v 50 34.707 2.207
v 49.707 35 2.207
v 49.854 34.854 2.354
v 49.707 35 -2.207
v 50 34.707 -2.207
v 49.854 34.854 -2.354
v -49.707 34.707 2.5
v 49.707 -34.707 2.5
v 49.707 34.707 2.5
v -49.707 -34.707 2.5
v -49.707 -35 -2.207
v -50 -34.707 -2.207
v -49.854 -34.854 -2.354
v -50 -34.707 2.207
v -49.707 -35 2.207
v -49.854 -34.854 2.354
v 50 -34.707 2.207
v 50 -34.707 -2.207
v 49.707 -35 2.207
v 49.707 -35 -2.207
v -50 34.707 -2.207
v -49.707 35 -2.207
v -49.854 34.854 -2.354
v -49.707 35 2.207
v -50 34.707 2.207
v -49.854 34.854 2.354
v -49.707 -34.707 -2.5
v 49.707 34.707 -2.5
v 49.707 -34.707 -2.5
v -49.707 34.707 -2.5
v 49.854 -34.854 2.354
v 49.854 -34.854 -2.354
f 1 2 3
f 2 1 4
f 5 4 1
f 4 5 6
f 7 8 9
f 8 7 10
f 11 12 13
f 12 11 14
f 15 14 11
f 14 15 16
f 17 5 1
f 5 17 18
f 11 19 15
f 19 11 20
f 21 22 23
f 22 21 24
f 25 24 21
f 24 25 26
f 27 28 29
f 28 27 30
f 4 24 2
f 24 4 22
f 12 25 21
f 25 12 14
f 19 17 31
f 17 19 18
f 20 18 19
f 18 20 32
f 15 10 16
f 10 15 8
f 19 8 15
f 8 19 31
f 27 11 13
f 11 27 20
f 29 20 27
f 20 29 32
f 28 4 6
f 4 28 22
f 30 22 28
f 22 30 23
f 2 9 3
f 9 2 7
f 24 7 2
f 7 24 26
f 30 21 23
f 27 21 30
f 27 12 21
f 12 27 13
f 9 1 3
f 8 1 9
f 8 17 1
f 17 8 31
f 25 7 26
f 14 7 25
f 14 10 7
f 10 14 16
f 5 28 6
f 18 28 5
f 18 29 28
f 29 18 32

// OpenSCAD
/*[Part]*/
part_to_print = "tile base"; // [tile base, tile, puzzle base, puzzle piece]
tile_or_puzzle_piece_number = 1; // [1,2,3,4,5,6,7,8,9,10,11,12,13,14,15,16,17,18,19,20]
//does not apply to base-specific measurements
scale_all_parts = 100; // [50:500]

/*[Base Options]*/
base_width = 100; // [20:300]
base_height = 70; // [20:300]
base_thickness = 5; // [3:10]

/*[Tile Base Options]*/
num_columns = 3; // [1:5]
num_rows = 2; // [1:5]
rail_width = 2; // [0:20]
include_target_graphics = "yes"; // [yes,no]
include_tile_slots = "yes"; // [yes,no]
include_earth_and_sky_lines = "no"; // [yes,no]
move_lines_vertically = 0; 

/*[Puzzle Base Options]*/
base_shape = "rectangular"; // [rectangular, circular]
include_puzzle_piece_slots = "no"; // [yes,no]

/*[Tile-Piece Options]*/
tile_thickness = 3; // [3:9]
//tenths of a millimeter
slot_gap = 10; // [0:30]
graphic_height = 2; // [1:5]

/*[--Tile-Piece 1 Info]*/
core_concept_1 = ""; 
beyond_core_concept_1 = ""; 
basic_shape_1 = ""; 
move_1_vertically = 0; // [-200:200]
move_piece_1_horizontally = 0; // [-200:200]
piece_1_scaling = 100; // [50:200]
piece_1_height = 20; // [5:300]
piece_1_width = 20; // [5:300]
embed_RFID_tag_1 = "no"; // [yes,no]

/*[--Tile-Piece 2 Info]*/
core_concept_2 = ""; 
beyond_core_concept_2 = ""; 
basic_shape_2 = ""; 
move_2_vertically = 0; // [-200:200]
move_piece_2_horizontally = 0; // [-200:200]
piece_2_scaling = 100; // [50:200]
piece_2_height = 20; // [5:300]
piece_2_width = 20; // [5:300]
embed_RFID_tag_2 = "no"; // [yes,no]

/*[--Tile-Piece 3 Info]*/
core_concept_3 = ""; 
beyond_core_concept_3 = ""; 
basic_shape_3 = ""; 
move_3_vertically = 0; // [-200:200]
move_piece_3_horizontally = 0; // [-200:200]
piece_3_scaling = 100; // [50:200]
piece_3_height = 20; // [5:300]
piece_3_width = 20; // [5:300]
embed_RFID_tag_3 = "no"; // [yes,no]

/*[--Tile-Piece 4 Info]*/
core_concept_4 = ""; 
beyond_core_concept_4 = ""; 
basic_shape_4 = ""; 
move_4_vertically = 0; // [-200:200]
move_piece_4_horizontally = 0; // [-200:200]
piece_4_scaling = 100; // [50:200]
piece_4_height = 20; // [5:300]
piece_4_width = 20; // [5:300]
embed_RFID_tag_4 = "no"; // [yes,no]

/*[--Tile-Piece 5 Info]*/
core_concept_5 = ""; 
beyond_core_concept_5 = ""; 
basic_shape_5 = ""; 
move_5_vertically = 0; // [-200:200]
move_piece_5_horizontally = 0; // [-200:200]
piece_5_scaling = 100; // [50:200]
piece_5_height = 20; // [5:300]
piece_5_width = 20; // [5:300]
embed_RFID_tag_5 = "no"; // [yes,no]

/*[--Tile-Piece 6 Info]*/
core_concept_6 = ""; 
beyond_core_concept_6 = ""; 
basic_shape_6 = ""; 
move_6_vertically = 0; // [-200:200]
move_piece_6_horizontally = 0; // [-200:200]
piece_6_scaling = 100; // [50:200]
piece_6_height = 20; // [5:300]
piece_6_width = 20; // [5:300]
embed_RFID_tag_6 = "no"; // [yes,no]

/*[--Tile-Piece 7 Info]*/
core_concept_7 = ""; 
beyond_core_concept_7 = ""; 
basic_shape_7 = ""; 
move_7_vertically = 0; // [-200:200]
move_piece_7_horizontally = 0; // [-200:200]
piece_7_scaling = 100; // [50:200]
piece_7_height = 20; // [10:300]
piece_7_width = 20; // [10:300]
embed_RFID_tag_7 = "no"; // [yes,no]

/*[--Tile-Piece 8 Info]*/
core_concept_8 = ""; 
beyond_core_concept_8 = ""; 
basic_shape_8 = ""; 
move_8_vertically = 0; // [-200:200]
move_piece_8_horizontally = 0; // [-200:200]
piece_8_scaling = 100; // [50:200]
piece_8_height = 20; // [10:300]
piece_8_width = 20; // [10:300]
embed_RFID_tag_8 = "no"; // [yes,no]

/*[--Tile-Piece 9 Info]*/
core_concept_9 = ""; 
beyond_core_concept_9 = ""; 
basic_shape_9 = ""; 
move_9_vertically = 0; // [-200:200]
move_piece_9_horizontally = 0; // [-200:200]
piece_9_scaling = 100; // [50:200]
piece_9_height = 20; // [10:300]
piece_9_width = 20; // [10:300]
embed_RFID_tag_9 = "no"; // [yes,no]

/*[--Tile-Piece 10 Info]*/
core_concept_10 = ""; 
beyond_core_concept_10 = ""; 
basic_shape_10 = ""; 
move_10_vertically = 0; // [-200:200]
move_piece_10_horizontally = 0; // [-200:200]
piece_10_scaling = 100; // [50:200]
piece_10_height = 20; // [10:300]
piece_10_width = 20; // [10:300]
embed_RFID_tag_10 = "no"; // [yes,no]

/*[--Tile-Piece 11 Info]*/
core_concept_11 = ""; 
beyond_core_concept_11 = ""; 
basic_shape_11 = ""; 
move_11_vertically = 0; // [-200:200]
move_piece_11_horizontally = 0; // [-200:200]
piece_11_scaling = 100; // [50:200]
piece_11_height = 20; // [10:300]
piece_11_width = 20; // [10:300]
embed_RFID_tag_11 = "no"; // [yes,no]

/*[--Tile-Piece 12 Info]*/
core_concept_12 = ""; 
beyond_core_concept_12 = ""; 
basic_shape_12 = ""; 
move_12_vertically = 0; // [-200:200]
move_piece_12_horizontally = 0; // [-200:200]
piece_12_scaling = 100; // [50:200]
piece_12_height = 20; // [10:300]
piece_12_width = 20; // [10:300]
embed_RFID_tag_12 = "no"; // [yes,no]

/*[--Tile-Piece 13 Info]*/
core_concept_13 = ""; 
beyond_core_concept_13 = ""; 
basic_shape_13 = ""; 
move_13_vertically = 0; // [-200:200]
move_piece_13_horizontally = 0; // [-200:200]
piece_13_scaling = 100; // [50:200]
piece_13_height = 20; // [10:300]
piece_13_width = 20; // [10:300]
embed_RFID_tag_13 = "no"; // [yes,no]

/*[--Tile-Piece 14 Info]*/
core_concept_14 = ""; 
beyond_core_concept_14 = ""; 
basic_shape_14 = ""; 
move_14_vertically = 0; // [-200:200]
move_piece_14_horizontally = 0; // [-200:200]
piece_14_scaling = 100; // [50:200]
piece_14_height = 20; // [10:300]
piece_14_width = 20; // [10:300]
embed_RFID_tag_14 = "no"; // [yes,no]

/*[--Tile-Piece 15 Info]*/
core_concept_15 = ""; 
beyond_core_concept_15 = ""; 
basic_shape_15 = ""; 
move_15_vertically = 0; // [-200:200]
move_piece_15_horizontally = 0; // [-200:200]
piece_15_scaling = 100; // [50:200]
piece_15_height = 20; // [10:300]
piece_15_width = 20; // [10:300]
embed_RFID_tag_15 = "no"; // [yes,no]

/*[--Tile-Piece 16 Info]*/
core_concept_16 = ""; 
beyond_core_concept_16 = ""; 
basic_shape_16 = ""; 
move_16_vertically = 0; // [-200:200]
move_piece_16_horizontally = 0; // [-200:200]
piece_16_scaling = 100; // [50:200]
piece_16_height = 20; // [10:300]
piece_16_width = 20; // [10:300]
embed_RFID_tag_16 = "no"; // [yes,no]

/*[--Tile-Piece 17 Info]*/
core_concept_17 = ""; 
beyond_core_concept_17 = ""; 
basic_shape_17 = ""; 
move_17_vertically = 0; // [-200:200]
move_piece_17_horizontally = 0; // [-200:200]
piece_17_scaling = 100; // [50:200]
piece_17_height = 20; // [10:300]
piece_17_width = 20; // [10:300]
embed_RFID_tag_17 = "no"; // [yes,no]

/*[--Tile-Piece 18 Info]*/
core_concept_18 = ""; 
beyond_core_concept_18 = ""; 
basic_shape_18 = ""; 
move_18_vertically = 0; // [-200:200]
move_piece_18_horizontally = 0; // [-200:200]
piece_18_scaling = 100; // [50:200]
piece_18_height = 20; // [10:300]
piece_18_width = 20; // [10:300]
embed_RFID_tag_18 = "no"; // [yes,no]

/*[--Tile-Piece 19 Info]*/
core_concept_19 = ""; 
beyond_core_concept_19 = ""; 
basic_shape_19 = ""; 
move_19_vertically = 0; // [-200:200]
move_piece_19_horizontally = 0; // [-200:200]
piece_19_scaling = 100; // [50:200]
piece_19_height = 20; // [10:300]
piece_19_width = 20; // [10:300]
embed_RFID_tag_19 = "no"; // [yes,no]

/*[--Tile-Piece 20 Info]*/
core_concept_20 = ""; 
beyond_core_concept_20 = ""; 
basic_shape_20 = ""; 
move_20_vertically = 0; // [-200:200]
move_piece_20_horizontally = 0; // [-200:200]
piece_20_scaling = 100; // [50:200]
piece_20_height = 20; // [10:300]
piece_20_width = 20; // [10:300]
embed_RFID_tag_20 = "no"; // [yes,no]

/*[---Decoration 1 Info]*/
decoration_type_1 = "-none-"; // [-none-,circle,line]
// height value is in 10ths of a millimeter
height_1 = 0; // [0:20]
b_1 = 0;
c_1 = 0;
d_1 = 0;
e_1 = 0;
f_1 = 0;

/*[---Decoration 2 Info]*/
decoration_type_2 = "-none-"; // [-none-,circle,line]
// height value is in 10ths of a millimeter
height_2 = 0; // [0:20]
b_2 = 0;
c_2 = 0;
d_2 = 0;
e_2 = 0;
f_2 = 0;

/*[---Decoration 3 Info]*/
decoration_type_3 = "-none-"; // [-none-,circle,line]
// height value is in 10ths of a millimeter
height_3 = 0; // [0:20]
b_3 = 0;
c_3 = 0;
d_3 = 0;
e_3 = 0;
f_3 = 0;

/*[---Decoration 4 Info]*/
decoration_type_4 = "-none-"; // [-none-,circle,line]
// height value is in 10ths of a millimeter
height_4 = 0; // [0:20]
b_4 = 0;
c_4 = 0;
d_4 = 0;
e_4 = 0;
f_4 = 0;

/*[---Decoration 5 Info]*/
decoration_type_5 = "-none-"; // [-none-,circle,line]
// height value is in 10ths of a millimeter
height_5 = 0; // [0:20]
b_5 = 0;
c_5 = 0;
d_5 = 0;
e_5 = 0;
f_5 = 0;




/*[Hidden]*/

// Version of this .scad; the web app compares a user's local copy against the
// published manifest (latest_tiles_version.json) to offer updates. Released via
// "bump btp" (see RELEASING.md). On GitHub main this must equal the manifest's
// version.
scad_version = 1;

//general
chamfer = .5;
fudge = 0.005;
sap = scale_all_parts/100;

//base
b_w = base_width;
b_h = base_height;
b_t = base_thickness;

//tile base
row_offset = (include_target_graphics == "yes" && include_tile_slots=="yes") ? 2 : 1;

// c_ = 1;
c_ = 2;
e_ = b_w - 2*c_;
d_ = b_h - 2*c_;
f_ = e_/num_columns;
t_r = (include_target_graphics=="yes") ? 2 : 1;
g_ = d_/(num_rows*t_r);
h_ = (num_rows>1) ? rail_width/2 : 0;
i_ = (num_columns>1) ? rail_width/2 :0;
j_ = f_ - 2*i_;
k_ = g_ - 2*h_;

c_x = (b_w - 2*c_)/num_columns - 2*h_;
c_y = (b_h - 2*c_)/(num_rows*row_offset) - 2*h_;

gap3 = min(c_x,c_y);

b_x = (((b_w-2*c_)/num_columns)-gap3)/2;
b_y = ((b_h-2*c_)/(num_rows*row_offset)-gap3)/2;

base_x0 = -b_w/2;
base_y0 = -b_h/2;

//tiles
tile_width = j_;
tile_height = k_;

total_rows = (include_target_graphics=="yes" && include_tile_slots=="yes") ? num_rows*2 : num_rows;
inter_row_distance = (b_h - c_*2 - tile_height*total_rows)/total_rows;

s_g = slot_gap/10;

tile_slot_width = tile_width;
tile_slot_height = tile_height;
t_h = tile_height - s_g;
t_w = tile_width - s_g;


echo(tile_slot_width=tile_slot_width);
echo(tile_slot_height=tile_slot_height);
echo(tile_width=t_w);
echo(tile_height=t_h);

//graphics
core_concepts = concat(core_concept_1,core_concept_2,core_concept_3,core_concept_4,core_concept_5,core_concept_6,core_concept_7,core_concept_8,core_concept_9,core_concept_10,core_concept_11,core_concept_12,core_concept_13,core_concept_14,core_concept_15,core_concept_16,core_concept_17,core_concept_18,core_concept_19,core_concept_20);

beyond_core_concepts = concat(beyond_core_concept_1,beyond_core_concept_2,beyond_core_concept_3,beyond_core_concept_4,beyond_core_concept_5,beyond_core_concept_6,beyond_core_concept_7,beyond_core_concept_8,beyond_core_concept_9,beyond_core_concept_10,beyond_core_concept_11,beyond_core_concept_12,beyond_core_concept_13,beyond_core_concept_14,beyond_core_concept_15,beyond_core_concept_16,beyond_core_concept_17,beyond_core_concept_18,beyond_core_concept_19,beyond_core_concept_20);

basic_shapes = concat(basic_shape_1,basic_shape_2,basic_shape_3,basic_shape_4,basic_shape_5,basic_shape_6,basic_shape_7,basic_shape_8,basic_shape_9,basic_shape_10,basic_shape_11,basic_shape_12,basic_shape_13,basic_shape_14,basic_shape_15,basic_shape_16,basic_shape_17,basic_shape_18,basic_shape_19,basic_shape_20);

vertical_move = concat(move_1_vertically*sap,move_2_vertically*sap,move_3_vertically*sap,move_4_vertically*sap,move_5_vertically*sap,move_6_vertically*sap,move_7_vertically*sap,move_8_vertically*sap,move_9_vertically*sap,move_10_vertically*sap,move_11_vertically*sap,move_12_vertically*sap,move_13_vertically*sap,move_14_vertically*sap,move_15_vertically*sap,move_16_vertically*sap,move_17_vertically*sap,move_18_vertically*sap,move_19_vertically*sap,move_20_vertically*sap);

horizonal_move = concat(move_piece_1_horizontally*sap,move_piece_2_horizontally*sap,move_piece_3_horizontally*sap,move_piece_4_horizontally*sap,move_piece_5_horizontally*sap,move_piece_6_horizontally*sap,move_piece_7_horizontally*sap,move_piece_8_horizontally*sap,move_piece_9_horizontally*sap,move_piece_10_horizontally*sap,move_piece_11_horizontally*sap,move_piece_12_horizontally*sap,move_piece_13_horizontally*sap,move_piece_14_horizontally*sap,move_piece_15_horizontally*sap,move_piece_16_horizontally*sap,move_piece_17_horizontally*sap,move_piece_18_horizontally*sap,move_piece_19_horizontally*sap,move_piece_20_horizontally*sap);

piece_scaling = concat(piece_1_scaling*sap,piece_2_scaling*sap,piece_3_scaling*sap,piece_4_scaling*sap,piece_5_scaling*sap,piece_6_scaling*sap,piece_7_scaling*sap,piece_8_scaling*sap,piece_9_scaling*sap,piece_10_scaling*sap,piece_11_scaling*sap,piece_12_scaling*sap,piece_13_scaling*sap,piece_14_scaling*sap,piece_15_scaling*sap,piece_16_scaling*sap,piece_17_scaling*sap,piece_18_scaling*sap,piece_19_scaling*sap,piece_20_scaling*sap);

piece_height = concat(piece_1_height*sap,piece_2_height*sap,piece_3_height*sap,piece_4_height*sap,piece_5_height*sap,piece_6_height*sap,piece_7_height*sap,piece_8_height*sap,piece_9_height*sap,piece_10_height*sap,piece_11_height*sap,piece_12_height*sap,piece_13_height*sap,piece_14_height*sap,piece_15_height*sap,piece_16_height*sap,piece_17_height*sap,piece_18_height*sap,piece_19_height*sap,piece_20_height*sap);

piece_width = concat(piece_1_width*sap,piece_2_width*sap,piece_3_width*sap,piece_4_width*sap,piece_5_width*sap,piece_6_width*sap,piece_7_width*sap,piece_8_width*sap,piece_9_width*sap,piece_10_width*sap,piece_11_width*sap,piece_12_width*sap,piece_13_width*sap,piece_14_width*sap,piece_15_width*sap,piece_16_height*sap,piece_17_width*sap,piece_18_width*sap,piece_19_width*sap,piece_20_width*sap);

embed_tag = concat(embed_RFID_tag_1,embed_RFID_tag_2,embed_RFID_tag_3,embed_RFID_tag_4,embed_RFID_tag_5,embed_RFID_tag_6,embed_RFID_tag_7,embed_RFID_tag_8,embed_RFID_tag_9,embed_RFID_tag_10,embed_RFID_tag_11,embed_RFID_tag_12,embed_RFID_tag_13,embed_RFID_tag_14,embed_RFID_tag_15,embed_RFID_tag_16,embed_RFID_tag_17,embed_RFID_tag_18,embed_RFID_tag_19,embed_RFID_tag_20);

core_concept_path = "core concepts/";
beyond_core_concept_path = "beyond core concepts/";
basic_shape_path = "basic shapes/";

a = concat(height_1/10,height_2/10,height_3/10,height_4/10,height_5/10);
b = concat(b_1,b_2,b_3,b_4,b_5);
c = concat(c_1,c_2,c_3,c_4,c_5);
d = concat(d_1,d_2,d_3,d_4,d_5);
e = concat(e_1,e_2,e_3,e_4,e_5);
f = concat(f_1,f_2,f_3,f_4,f_5);
decoration_type = concat(decoration_type_1,decoration_type_2,decoration_type_3,decoration_type_4,decoration_type_5);



//****************** Main Program **********************************

if (part_to_print == "tile base"){
	//create base slab with cutouts
	difference(){

		chamfered_cuboid(b_w,b_h,b_t,chamfer);
		
		for (i = [0:(num_rows-1)*row_offset]){
			if (i%row_offset==0){
				y = base_y0+gap3/2+c_+b_y+gap3*i+b_y*2*i;
				if (include_tile_slots=="yes"){
					for (j = [0:num_columns-1]){
						core_concept = core_concepts[i/row_offset*num_columns+j];
						beyond_core_concept = beyond_core_concepts[i/row_offset*num_columns+j];
						shape = basic_shapes[i/row_offset*num_columns+j];
						graphic = (core_concept != "") ? core_concept : 
								  (beyond_core_concept != "") ? beyond_core_concept : shape;
						if (graphic != ""){
							x = base_x0+gap3/2+c_+b_x+gap3*j+b_x*2*j;
							translate([x, y, tile_thickness/2+fudge])
							cube([tile_slot_width,tile_slot_height,tile_thickness],center=true);
						}
					}
				}
				if (include_earth_and_sky_lines=="yes"){
					spread = 23*sap;
					earth_y1 = y-(spread/2) + move_lines_vertically*sap;
					sky_y1 = earth_y1+(spread);
					
					translate([0,earth_y1,b_t/2+fudge])
					rotate([0,90,0])
					translate([0,0,-b_w/2])
					linear_extrude(height=b_w)
					circle(d=sap*2,$fn=2);
				
					translate([0,sky_y1,b_t/2+fudge])
					rotate([0,90,0])
					translate([0,0,-b_w/2])
					linear_extrude(height=b_w)
					circle(d=sap,$fn=2);
					
					if(include_target_graphics=="yes" && include_tile_slots=="yes"){
						earth_y2 = sky_y1+tile_height-spread+inter_row_distance;
						sky_y2 = earth_y2+(spread);
						
						translate([0,earth_y2,b_t/2+fudge])
						rotate([0,90,0])
						translate([0,0,-b_w/2])
						linear_extrude(height=b_w)
						circle(d=sap*2,$fn=2);

					
						translate([0,sky_y2,b_t/2+fudge])
						rotate([0,90,0])
						translate([0,0,-b_w/2])
						linear_extrude(height=b_w)
						circle(d=sap,$fn=2);
					}
				}	
			}
		}
	}

	// add graphics in target rows
	if (include_target_graphics == "yes"){
		color("SlateGrey")
		for (i = [0:(num_rows-1)*row_offset]){
			if (i%row_offset==0){
			
				for (j = [0:num_columns-1]){
					core_concept = core_concepts[i/row_offset*num_columns+j];
					beyond_core_concept = beyond_core_concepts[i/row_offset*num_columns+j];
					basic_shape = basic_shapes[i/row_offset*num_columns+j];
					path = (core_concept != "") ? core_concept_path : 
							  (beyond_core_concept != "") ? beyond_core_concept_path : basic_shape_path;
					filename = (core_concept != "") ? core_concept : 
							  (beyond_core_concept != "") ? beyond_core_concept : basic_shape;
					if (filename != ""){
						target_offset = (include_tile_slots=="yes") ? 1 : 0;
						file = str(path,filename,".stl");
						y_offset = vertical_move[i/row_offset*num_columns+j];
						x = base_x0+gap3/2+c_+b_x+gap3*j+b_x*2*j;
						y = base_y0+c_+b_y+gap3/2+(gap3+b_y*2)*(i+target_offset);
						translate([x, y+y_offset, b_t/2 - (6 - graphic_height)])
						scale([sap,sap,1])
						import(file, convexity=3);
					}
				}
			}
		}
	}
}
else if (part_to_print == "tile"){
			
	difference(){
		union(){
			difference(){
				chamfered_cuboid(tile_width-s_g,tile_height-s_g,tile_thickness,chamfer);
				
				if (include_earth_and_sky_lines=="yes"){
					spread = 23*sap;
					earth_y1 = -gap3/2+(gap3-spread)/2 + move_lines_vertically*sap;
					sky_y1 = earth_y1+(spread);

					translate([0,earth_y1,tile_thickness/2+fudge])
					rotate([0,90,0])
					translate([0,0,-gap3/2])
					linear_extrude(height=gap3)
					circle(d=sap*2,$fn=2);
				
					translate([0,sky_y1,tile_thickness/2+fudge])
					rotate([0,90,0])
					translate([0,0,-gap3/2])
					linear_extrude(height=gap3)
					circle(d=sap,$fn=2);
				}
			}
			
			core_concept = core_concepts[tile_or_puzzle_piece_number-1];
			beyond_core_concept = beyond_core_concepts[tile_or_puzzle_piece_number-1];
			basic_shape = basic_shapes[tile_or_puzzle_piece_number-1];
			path = (core_concept != "") ? core_concept_path : 
					  (beyond_core_concept != "") ? beyond_core_concept_path : basic_shape_path;
			filename = (core_concept != "") ? core_concept : 
					  (beyond_core_concept != "") ? beyond_core_concept : basic_shape;
			
			if (filename != ""){
				file = str(path,filename,".stl");
				offset = vertical_move[tile_or_puzzle_piece_number-1];
				color("SlateGrey")
				translate([0, offset, tile_thickness/2 - (6 - graphic_height)])
				scale([sap,sap,1])
				import(file, convexity=3);
			}
		}
		
		translate([0,0,-tile_thickness/2-3-fudge])
		cube([tile_width*2,tile_height*2,6],center=true);
			
		//RFID tag
		if(embed_tag[tile_or_puzzle_piece_number-1]=="yes"){
			add_RFID_slot();
		}
	}
}

else if (part_to_print == "puzzle base"){
	
	if (include_puzzle_piece_slots=="yes"){
		difference(){
			union(){
				if(base_shape == "rectangular"){
					chamfered_cuboid(b_w,b_h,b_t,chamfer);
				}
				else{
					chamfered_disk(b_w,b_t,chamfer);
				}
				
				add_decorations();
				
			}
			for (i = [0:19]){
				core_concept = core_concepts[i];
				beyond_core_concept = beyond_core_concepts[i];
				basic_shape = basic_shapes[i];
				graphic = (core_concept != "") ? core_concept : 
						  (beyond_core_concept != "") ? beyond_core_concept : basic_shape;
				if (graphic != ""){
					graphic_x = horizonal_move[i];
					graphic_y = vertical_move[i];
					graphic_scale = 100;
					piece_base_width = piece_width[i];
					piece_base_height = piece_height[i];
					slot_width = piece_base_width + s_g;
					slot_height = piece_base_height + s_g;
					if (include_tile_slots=="yes"){
						translate([graphic_x, graphic_y, tile_thickness/2+2.5+fudge])
						cube([slot_width,slot_height,tile_thickness+5],center=true);
					}
				}
			}
		}
	}
	
	else{
	
		if(base_shape == "rectangular"){
			chamfered_cuboid(b_w,b_h,b_t,chamfer);
		}
		else{
			chamfered_disk(b_w,b_t,chamfer);
		}
		
		color("SlateGrey")
		for (i = [0:19]){
			core_concept = core_concepts[i];
			beyond_core_concept = beyond_core_concepts[i];
			basic_shape = basic_shapes[i];
			path = (core_concept != "") ? core_concept_path : 
					  (beyond_core_concept != "") ? beyond_core_concept_path : basic_shape_path;
			filename = (core_concept != "") ? core_concept : 
					  (beyond_core_concept != "") ? beyond_core_concept : basic_shape;
			
			if (filename != ""){
				graphic_x = horizonal_move[i];
				graphic_y = vertical_move[i];
				graphic_scale = piece_scaling[i]/100;
				file = str(path,filename,".stl");
			
				translate([graphic_x, graphic_y, b_t/2 - (6 - graphic_height)])
				scale([graphic_scale,graphic_scale,1])
				import(file, convexity=3);
			
			}
		}
		
		add_decorations();
	}
	
}
else if (part_to_print == "puzzle piece"){
	
	core_concept = core_concepts[tile_or_puzzle_piece_number-1];
	beyond_core_concept = beyond_core_concepts[tile_or_puzzle_piece_number-1];
	basic_shape = basic_shapes[tile_or_puzzle_piece_number-1];
	piece_base_width = piece_width[tile_or_puzzle_piece_number-1];
	piece_base_height = piece_height[tile_or_puzzle_piece_number-1];
	graphic_scale = piece_scaling[tile_or_puzzle_piece_number-1]/100;
	path = (core_concept != "") ? core_concept_path : 
			  (beyond_core_concept != "") ? beyond_core_concept_path : basic_shape_path;
	filename = (core_concept != "") ? core_concept : 
			  (beyond_core_concept != "") ? beyond_core_concept : basic_shape;

	difference(){
		union(){
			
			if (filename != ""){
				file = str(path,filename,".stl");
				color("SlateGrey")
				translate([0, 0, tile_thickness/2 - (6 - graphic_height)])
				scale([graphic_scale,graphic_scale,1])
				import(file, convexity=3);
			}
				
			chamfered_cuboid(piece_base_width, piece_base_height, tile_thickness,chamfer);
		}
		
		s_g = slot_gap/10;

		offset_x = horizonal_move[tile_or_puzzle_piece_number-1];
		offset_y = vertical_move[tile_or_puzzle_piece_number-1];

		for (i = [tile_or_puzzle_piece_number:19]){
			core_concept = core_concepts[i];
			beyond_core_concept = beyond_core_concepts[i];
			basic_shape = basic_shapes[i];
			graphic = (core_concept != "") ? core_concept : 
					  (beyond_core_concept != "") ? beyond_core_concept : basic_shape;
			
			if (graphic != ""){
				graphic_x = horizonal_move[i] - offset_x;
				graphic_y = vertical_move[i] - offset_y;
				piece_base_width = piece_width[i];
				piece_base_height = piece_height[i];
				slot_width = piece_base_width + s_g;
				slot_height = piece_base_height + s_g;
				if (include_tile_slots=="yes"){
					translate([graphic_x, graphic_y, 0])
					cube([slot_width,slot_height,(tile_thickness + graphic_height) * 2 + 5],center=true);
				}
			}
		}

		translate([0,0,-tile_thickness/2-3-fudge])
		cube([piece_base_width*2,piece_base_height*2,6],center=true);
			
		//RFID tag
		if(embed_tag[tile_or_puzzle_piece_number-1]=="yes"){
			add_RFID_slot();
		}
	}
}





//********************************** Modules **************************************

module chamfered_cuboid (x, y, z, c){
	intersection(){	
		translate([0,0,-z/2])
		linear_extrude(height=z)
		offset(delta=c, chamfer=true)
		square([x-2*c,y-2*c],center=true);

		rotate([0,90,0])
		translate([0,0,-x/2])
		linear_extrude(height=x)
		offset(delta=c, chamfer=true)
		square([z-2*c,y-2*c],center=true);

		rotate([90,0,0])
		translate([0,0,-y/2])
		linear_extrude(height=y)
		offset(delta=c, chamfer=true)
		square([x-2*c,z-2*c],center=true);
	}
}

module chamfered_disk (dia, thick, c){
	r = dia/2;
	
	translate([0,0,-thick/2])
	rotate_extrude($fn=200)
	polygon( points=[[0,0],[r-c,0],[r,c],[r,thick-c],[r-c,thick],[0,thick]] );
}

module add_RFID_slot(){
	translate([0,0,-tile_thickness/2+1])
	cylinder(d=30,h=1);
}

module add_decorations(){

	color("SlateGrey")
	for (i = [0:4]){
		if (a[i] > 0){
			if (decoration_type[i]=="circle") {
				// a[i] = decoration height
				// b[i] = circle thickness
				// c[i] = circle inner diameter
				// d[i] = move vertically
				// e[i] = move horizontally
				
				translate([e[i]*sap,d[i]*sap,1])
				linear_extrude(height=tile_thickness/2+a[i])
				difference(){
					circle(d=c[i]*sap+b[i]*sap, $fn=200);
					circle(d=c[i]*sap, $fn=200);
				}
			}
			else if (decoration_type[i]=="line"){
				// a[i] = decoration height
				// b[i] = x1
				// c[i] = y1
				// d[i] = x2
				// e[i] = y2
				// f[i] = line thickness
				
				bad = (b[i]==c[i] && d[i]==e[i] && b[i]==e[i]);
				if (!bad){
					run = d[i]*sap - b[i]*sap;
					sign_run = sign(run);
					rise = e[i]*sap - c[i]*sap;
					sign_rise = sign(rise);
					adjust = (sign_rise>=0 && sign_run>=0) ? 0 : 
							  (sign_rise>=0 && sign_run<0) ? -180 :
							  (sign_rise<0 && sign_run>=0) ? 0 :
															 -180;
					slope = atan(rise/run) + adjust;
					length = sqrt(rise*rise + run*run);
					
					translate([b[i]*sap,c[i]*sap,tile_thickness/2+1])
					rotate([0,0,slope])
					linear_extrude(height=a[i])
					translate([0,-f[i]/2*sap,0])
					square([length,f[i]*sap]);
				}
			}
		}
	}
}
